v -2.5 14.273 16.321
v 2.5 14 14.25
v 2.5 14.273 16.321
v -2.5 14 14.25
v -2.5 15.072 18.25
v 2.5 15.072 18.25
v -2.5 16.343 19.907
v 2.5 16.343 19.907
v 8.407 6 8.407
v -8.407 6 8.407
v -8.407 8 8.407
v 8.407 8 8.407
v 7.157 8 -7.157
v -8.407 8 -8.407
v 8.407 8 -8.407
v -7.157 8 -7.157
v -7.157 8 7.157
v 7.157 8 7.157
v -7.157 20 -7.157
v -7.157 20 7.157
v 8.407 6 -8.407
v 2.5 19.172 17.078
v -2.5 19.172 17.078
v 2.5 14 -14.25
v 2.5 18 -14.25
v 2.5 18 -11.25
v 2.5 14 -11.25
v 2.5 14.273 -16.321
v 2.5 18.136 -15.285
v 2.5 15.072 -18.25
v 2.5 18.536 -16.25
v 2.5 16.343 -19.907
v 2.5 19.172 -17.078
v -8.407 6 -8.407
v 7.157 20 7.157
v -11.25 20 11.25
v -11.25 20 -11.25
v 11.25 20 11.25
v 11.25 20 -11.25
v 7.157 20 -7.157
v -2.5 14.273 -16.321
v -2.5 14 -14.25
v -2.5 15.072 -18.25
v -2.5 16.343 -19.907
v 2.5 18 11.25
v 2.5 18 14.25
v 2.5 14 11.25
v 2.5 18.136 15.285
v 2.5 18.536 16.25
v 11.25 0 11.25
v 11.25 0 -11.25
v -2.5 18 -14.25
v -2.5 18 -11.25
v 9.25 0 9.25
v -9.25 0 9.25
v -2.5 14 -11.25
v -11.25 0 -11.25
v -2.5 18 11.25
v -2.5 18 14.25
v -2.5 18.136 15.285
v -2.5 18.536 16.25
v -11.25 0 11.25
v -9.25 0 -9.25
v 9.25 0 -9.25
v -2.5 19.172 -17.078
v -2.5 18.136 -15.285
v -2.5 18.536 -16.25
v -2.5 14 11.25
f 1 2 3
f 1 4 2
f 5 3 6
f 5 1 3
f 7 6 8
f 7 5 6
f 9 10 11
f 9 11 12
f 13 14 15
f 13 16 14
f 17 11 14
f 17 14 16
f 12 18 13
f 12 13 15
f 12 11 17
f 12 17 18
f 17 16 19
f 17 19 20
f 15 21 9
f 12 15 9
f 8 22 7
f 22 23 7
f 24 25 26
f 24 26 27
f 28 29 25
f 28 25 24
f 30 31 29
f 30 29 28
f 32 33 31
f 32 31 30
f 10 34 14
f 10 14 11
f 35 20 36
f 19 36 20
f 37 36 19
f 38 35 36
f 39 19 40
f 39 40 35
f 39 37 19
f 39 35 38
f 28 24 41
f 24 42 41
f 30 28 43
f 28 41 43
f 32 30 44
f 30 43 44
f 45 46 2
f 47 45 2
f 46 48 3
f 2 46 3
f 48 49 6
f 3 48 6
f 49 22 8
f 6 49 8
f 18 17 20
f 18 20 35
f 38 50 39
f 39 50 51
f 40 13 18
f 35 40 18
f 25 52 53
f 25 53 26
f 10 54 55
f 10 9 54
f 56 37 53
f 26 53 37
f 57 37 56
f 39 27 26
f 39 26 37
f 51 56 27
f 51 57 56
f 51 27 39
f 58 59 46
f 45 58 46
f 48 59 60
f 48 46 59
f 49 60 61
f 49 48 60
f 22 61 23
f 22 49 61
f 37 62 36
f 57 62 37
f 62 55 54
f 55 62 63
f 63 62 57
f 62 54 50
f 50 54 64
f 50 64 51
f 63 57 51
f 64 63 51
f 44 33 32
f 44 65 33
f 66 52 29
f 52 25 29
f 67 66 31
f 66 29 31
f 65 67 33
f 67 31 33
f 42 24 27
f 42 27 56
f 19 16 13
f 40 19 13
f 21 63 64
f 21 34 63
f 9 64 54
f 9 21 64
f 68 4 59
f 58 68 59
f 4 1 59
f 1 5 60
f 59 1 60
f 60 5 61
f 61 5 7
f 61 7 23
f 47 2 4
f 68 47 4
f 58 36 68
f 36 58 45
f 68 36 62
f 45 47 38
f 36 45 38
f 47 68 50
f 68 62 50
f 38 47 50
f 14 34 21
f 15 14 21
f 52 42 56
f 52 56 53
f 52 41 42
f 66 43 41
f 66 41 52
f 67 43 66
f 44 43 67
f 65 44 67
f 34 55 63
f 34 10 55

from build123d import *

# Parameters (mm, degrees)
SKETCH1_W           = 22.5
SKETCH1_H           = 22.5
BOSS_EXTRUDE1_DEPTH = 20
SKETCH5_W           = 5
SKETCH5_H           = 4
SKETCH3_W           = 18.5
SKETCH3_H           = 18.5
CUT_EXTRUDE5_DEPTH  = 6
CUT_EXTRUDE5_TAPER  = 8
SKETCH14_W          = 16.813509984
SKETCH14_H          = 16.813509984
CUT_EXTRUDE6_DEPTH  = 2
CUT_EXTRUDE7_REACH  = 14
SKETCH15_W          = 14.313509984
SKETCH15_H          = 14.313509984


with BuildPart() as part:
    # Sketch1 → Boss-Extrude1 (new body)
    with BuildSketch(Plane(origin=(0, 0, 0), x_dir=(1, 0, 0), z_dir=(0, 1, 0))):
        Rectangle(SKETCH1_W, SKETCH1_H)
    extrude(amount=BOSS_EXTRUDE1_DEPTH)

    # Sweep1: sweep along a path in Sketch6
    with BuildLine(Plane(origin=(0, 0, 0), x_dir=(0, 0, -1), z_dir=(1, 0, 0))) as sweep1_path:
        Line((11.25, 16), (14.25, 16))
        ThreePointArc((14.25, 16), (16.546100594, 16.456722805), (18.492640687, 17.757359313))
    # Sketch5 → Sweep1 (sweep)
    with BuildSketch(Plane(origin=(0, 0, -11.25), x_dir=(-1, 0, 0), z_dir=(0, 0, -1))):
        with Locations((0, 16)):
            Rectangle(SKETCH5_W, SKETCH5_H)
    sweep1 = sweep(path=sweep1_path.line)

    # Mirror1: Sweep1 across plane
    add(sweep1.mirror(Plane.XY))

    # Sketch3 → Cut-Extrude5 (cut)
    with BuildSketch(Plane.XZ):
        Rectangle(SKETCH3_W, SKETCH3_H)
    extrude(amount=-CUT_EXTRUDE5_DEPTH, taper=CUT_EXTRUDE5_TAPER, mode=Mode.SUBTRACT)

    # Sketch14 → Cut-Extrude6 (cut)
    with BuildSketch(Plane.XZ.offset(-6)):
        Rectangle(SKETCH14_W, SKETCH14_H)
    extrude(amount=-CUT_EXTRUDE6_DEPTH, mode=Mode.SUBTRACT)

    # Sketch15 → Cut-Extrude7 (cut, up to next)
    with BuildSketch(Plane.XZ.offset(-8), mode=Mode.PRIVATE) as cut_extrude7_sk1:
        Rectangle(SKETCH15_W, SKETCH15_H)
    cut_extrude7_tool1 = extrude(cut_extrude7_sk1.sketch, amount=-CUT_EXTRUDE7_REACH, mode=Mode.PRIVATE) & part.part
    add(cut_extrude7_tool1.solids().sort_by_distance((0, 8, 0))[0], mode=Mode.SUBTRACT)


solid = part.part
